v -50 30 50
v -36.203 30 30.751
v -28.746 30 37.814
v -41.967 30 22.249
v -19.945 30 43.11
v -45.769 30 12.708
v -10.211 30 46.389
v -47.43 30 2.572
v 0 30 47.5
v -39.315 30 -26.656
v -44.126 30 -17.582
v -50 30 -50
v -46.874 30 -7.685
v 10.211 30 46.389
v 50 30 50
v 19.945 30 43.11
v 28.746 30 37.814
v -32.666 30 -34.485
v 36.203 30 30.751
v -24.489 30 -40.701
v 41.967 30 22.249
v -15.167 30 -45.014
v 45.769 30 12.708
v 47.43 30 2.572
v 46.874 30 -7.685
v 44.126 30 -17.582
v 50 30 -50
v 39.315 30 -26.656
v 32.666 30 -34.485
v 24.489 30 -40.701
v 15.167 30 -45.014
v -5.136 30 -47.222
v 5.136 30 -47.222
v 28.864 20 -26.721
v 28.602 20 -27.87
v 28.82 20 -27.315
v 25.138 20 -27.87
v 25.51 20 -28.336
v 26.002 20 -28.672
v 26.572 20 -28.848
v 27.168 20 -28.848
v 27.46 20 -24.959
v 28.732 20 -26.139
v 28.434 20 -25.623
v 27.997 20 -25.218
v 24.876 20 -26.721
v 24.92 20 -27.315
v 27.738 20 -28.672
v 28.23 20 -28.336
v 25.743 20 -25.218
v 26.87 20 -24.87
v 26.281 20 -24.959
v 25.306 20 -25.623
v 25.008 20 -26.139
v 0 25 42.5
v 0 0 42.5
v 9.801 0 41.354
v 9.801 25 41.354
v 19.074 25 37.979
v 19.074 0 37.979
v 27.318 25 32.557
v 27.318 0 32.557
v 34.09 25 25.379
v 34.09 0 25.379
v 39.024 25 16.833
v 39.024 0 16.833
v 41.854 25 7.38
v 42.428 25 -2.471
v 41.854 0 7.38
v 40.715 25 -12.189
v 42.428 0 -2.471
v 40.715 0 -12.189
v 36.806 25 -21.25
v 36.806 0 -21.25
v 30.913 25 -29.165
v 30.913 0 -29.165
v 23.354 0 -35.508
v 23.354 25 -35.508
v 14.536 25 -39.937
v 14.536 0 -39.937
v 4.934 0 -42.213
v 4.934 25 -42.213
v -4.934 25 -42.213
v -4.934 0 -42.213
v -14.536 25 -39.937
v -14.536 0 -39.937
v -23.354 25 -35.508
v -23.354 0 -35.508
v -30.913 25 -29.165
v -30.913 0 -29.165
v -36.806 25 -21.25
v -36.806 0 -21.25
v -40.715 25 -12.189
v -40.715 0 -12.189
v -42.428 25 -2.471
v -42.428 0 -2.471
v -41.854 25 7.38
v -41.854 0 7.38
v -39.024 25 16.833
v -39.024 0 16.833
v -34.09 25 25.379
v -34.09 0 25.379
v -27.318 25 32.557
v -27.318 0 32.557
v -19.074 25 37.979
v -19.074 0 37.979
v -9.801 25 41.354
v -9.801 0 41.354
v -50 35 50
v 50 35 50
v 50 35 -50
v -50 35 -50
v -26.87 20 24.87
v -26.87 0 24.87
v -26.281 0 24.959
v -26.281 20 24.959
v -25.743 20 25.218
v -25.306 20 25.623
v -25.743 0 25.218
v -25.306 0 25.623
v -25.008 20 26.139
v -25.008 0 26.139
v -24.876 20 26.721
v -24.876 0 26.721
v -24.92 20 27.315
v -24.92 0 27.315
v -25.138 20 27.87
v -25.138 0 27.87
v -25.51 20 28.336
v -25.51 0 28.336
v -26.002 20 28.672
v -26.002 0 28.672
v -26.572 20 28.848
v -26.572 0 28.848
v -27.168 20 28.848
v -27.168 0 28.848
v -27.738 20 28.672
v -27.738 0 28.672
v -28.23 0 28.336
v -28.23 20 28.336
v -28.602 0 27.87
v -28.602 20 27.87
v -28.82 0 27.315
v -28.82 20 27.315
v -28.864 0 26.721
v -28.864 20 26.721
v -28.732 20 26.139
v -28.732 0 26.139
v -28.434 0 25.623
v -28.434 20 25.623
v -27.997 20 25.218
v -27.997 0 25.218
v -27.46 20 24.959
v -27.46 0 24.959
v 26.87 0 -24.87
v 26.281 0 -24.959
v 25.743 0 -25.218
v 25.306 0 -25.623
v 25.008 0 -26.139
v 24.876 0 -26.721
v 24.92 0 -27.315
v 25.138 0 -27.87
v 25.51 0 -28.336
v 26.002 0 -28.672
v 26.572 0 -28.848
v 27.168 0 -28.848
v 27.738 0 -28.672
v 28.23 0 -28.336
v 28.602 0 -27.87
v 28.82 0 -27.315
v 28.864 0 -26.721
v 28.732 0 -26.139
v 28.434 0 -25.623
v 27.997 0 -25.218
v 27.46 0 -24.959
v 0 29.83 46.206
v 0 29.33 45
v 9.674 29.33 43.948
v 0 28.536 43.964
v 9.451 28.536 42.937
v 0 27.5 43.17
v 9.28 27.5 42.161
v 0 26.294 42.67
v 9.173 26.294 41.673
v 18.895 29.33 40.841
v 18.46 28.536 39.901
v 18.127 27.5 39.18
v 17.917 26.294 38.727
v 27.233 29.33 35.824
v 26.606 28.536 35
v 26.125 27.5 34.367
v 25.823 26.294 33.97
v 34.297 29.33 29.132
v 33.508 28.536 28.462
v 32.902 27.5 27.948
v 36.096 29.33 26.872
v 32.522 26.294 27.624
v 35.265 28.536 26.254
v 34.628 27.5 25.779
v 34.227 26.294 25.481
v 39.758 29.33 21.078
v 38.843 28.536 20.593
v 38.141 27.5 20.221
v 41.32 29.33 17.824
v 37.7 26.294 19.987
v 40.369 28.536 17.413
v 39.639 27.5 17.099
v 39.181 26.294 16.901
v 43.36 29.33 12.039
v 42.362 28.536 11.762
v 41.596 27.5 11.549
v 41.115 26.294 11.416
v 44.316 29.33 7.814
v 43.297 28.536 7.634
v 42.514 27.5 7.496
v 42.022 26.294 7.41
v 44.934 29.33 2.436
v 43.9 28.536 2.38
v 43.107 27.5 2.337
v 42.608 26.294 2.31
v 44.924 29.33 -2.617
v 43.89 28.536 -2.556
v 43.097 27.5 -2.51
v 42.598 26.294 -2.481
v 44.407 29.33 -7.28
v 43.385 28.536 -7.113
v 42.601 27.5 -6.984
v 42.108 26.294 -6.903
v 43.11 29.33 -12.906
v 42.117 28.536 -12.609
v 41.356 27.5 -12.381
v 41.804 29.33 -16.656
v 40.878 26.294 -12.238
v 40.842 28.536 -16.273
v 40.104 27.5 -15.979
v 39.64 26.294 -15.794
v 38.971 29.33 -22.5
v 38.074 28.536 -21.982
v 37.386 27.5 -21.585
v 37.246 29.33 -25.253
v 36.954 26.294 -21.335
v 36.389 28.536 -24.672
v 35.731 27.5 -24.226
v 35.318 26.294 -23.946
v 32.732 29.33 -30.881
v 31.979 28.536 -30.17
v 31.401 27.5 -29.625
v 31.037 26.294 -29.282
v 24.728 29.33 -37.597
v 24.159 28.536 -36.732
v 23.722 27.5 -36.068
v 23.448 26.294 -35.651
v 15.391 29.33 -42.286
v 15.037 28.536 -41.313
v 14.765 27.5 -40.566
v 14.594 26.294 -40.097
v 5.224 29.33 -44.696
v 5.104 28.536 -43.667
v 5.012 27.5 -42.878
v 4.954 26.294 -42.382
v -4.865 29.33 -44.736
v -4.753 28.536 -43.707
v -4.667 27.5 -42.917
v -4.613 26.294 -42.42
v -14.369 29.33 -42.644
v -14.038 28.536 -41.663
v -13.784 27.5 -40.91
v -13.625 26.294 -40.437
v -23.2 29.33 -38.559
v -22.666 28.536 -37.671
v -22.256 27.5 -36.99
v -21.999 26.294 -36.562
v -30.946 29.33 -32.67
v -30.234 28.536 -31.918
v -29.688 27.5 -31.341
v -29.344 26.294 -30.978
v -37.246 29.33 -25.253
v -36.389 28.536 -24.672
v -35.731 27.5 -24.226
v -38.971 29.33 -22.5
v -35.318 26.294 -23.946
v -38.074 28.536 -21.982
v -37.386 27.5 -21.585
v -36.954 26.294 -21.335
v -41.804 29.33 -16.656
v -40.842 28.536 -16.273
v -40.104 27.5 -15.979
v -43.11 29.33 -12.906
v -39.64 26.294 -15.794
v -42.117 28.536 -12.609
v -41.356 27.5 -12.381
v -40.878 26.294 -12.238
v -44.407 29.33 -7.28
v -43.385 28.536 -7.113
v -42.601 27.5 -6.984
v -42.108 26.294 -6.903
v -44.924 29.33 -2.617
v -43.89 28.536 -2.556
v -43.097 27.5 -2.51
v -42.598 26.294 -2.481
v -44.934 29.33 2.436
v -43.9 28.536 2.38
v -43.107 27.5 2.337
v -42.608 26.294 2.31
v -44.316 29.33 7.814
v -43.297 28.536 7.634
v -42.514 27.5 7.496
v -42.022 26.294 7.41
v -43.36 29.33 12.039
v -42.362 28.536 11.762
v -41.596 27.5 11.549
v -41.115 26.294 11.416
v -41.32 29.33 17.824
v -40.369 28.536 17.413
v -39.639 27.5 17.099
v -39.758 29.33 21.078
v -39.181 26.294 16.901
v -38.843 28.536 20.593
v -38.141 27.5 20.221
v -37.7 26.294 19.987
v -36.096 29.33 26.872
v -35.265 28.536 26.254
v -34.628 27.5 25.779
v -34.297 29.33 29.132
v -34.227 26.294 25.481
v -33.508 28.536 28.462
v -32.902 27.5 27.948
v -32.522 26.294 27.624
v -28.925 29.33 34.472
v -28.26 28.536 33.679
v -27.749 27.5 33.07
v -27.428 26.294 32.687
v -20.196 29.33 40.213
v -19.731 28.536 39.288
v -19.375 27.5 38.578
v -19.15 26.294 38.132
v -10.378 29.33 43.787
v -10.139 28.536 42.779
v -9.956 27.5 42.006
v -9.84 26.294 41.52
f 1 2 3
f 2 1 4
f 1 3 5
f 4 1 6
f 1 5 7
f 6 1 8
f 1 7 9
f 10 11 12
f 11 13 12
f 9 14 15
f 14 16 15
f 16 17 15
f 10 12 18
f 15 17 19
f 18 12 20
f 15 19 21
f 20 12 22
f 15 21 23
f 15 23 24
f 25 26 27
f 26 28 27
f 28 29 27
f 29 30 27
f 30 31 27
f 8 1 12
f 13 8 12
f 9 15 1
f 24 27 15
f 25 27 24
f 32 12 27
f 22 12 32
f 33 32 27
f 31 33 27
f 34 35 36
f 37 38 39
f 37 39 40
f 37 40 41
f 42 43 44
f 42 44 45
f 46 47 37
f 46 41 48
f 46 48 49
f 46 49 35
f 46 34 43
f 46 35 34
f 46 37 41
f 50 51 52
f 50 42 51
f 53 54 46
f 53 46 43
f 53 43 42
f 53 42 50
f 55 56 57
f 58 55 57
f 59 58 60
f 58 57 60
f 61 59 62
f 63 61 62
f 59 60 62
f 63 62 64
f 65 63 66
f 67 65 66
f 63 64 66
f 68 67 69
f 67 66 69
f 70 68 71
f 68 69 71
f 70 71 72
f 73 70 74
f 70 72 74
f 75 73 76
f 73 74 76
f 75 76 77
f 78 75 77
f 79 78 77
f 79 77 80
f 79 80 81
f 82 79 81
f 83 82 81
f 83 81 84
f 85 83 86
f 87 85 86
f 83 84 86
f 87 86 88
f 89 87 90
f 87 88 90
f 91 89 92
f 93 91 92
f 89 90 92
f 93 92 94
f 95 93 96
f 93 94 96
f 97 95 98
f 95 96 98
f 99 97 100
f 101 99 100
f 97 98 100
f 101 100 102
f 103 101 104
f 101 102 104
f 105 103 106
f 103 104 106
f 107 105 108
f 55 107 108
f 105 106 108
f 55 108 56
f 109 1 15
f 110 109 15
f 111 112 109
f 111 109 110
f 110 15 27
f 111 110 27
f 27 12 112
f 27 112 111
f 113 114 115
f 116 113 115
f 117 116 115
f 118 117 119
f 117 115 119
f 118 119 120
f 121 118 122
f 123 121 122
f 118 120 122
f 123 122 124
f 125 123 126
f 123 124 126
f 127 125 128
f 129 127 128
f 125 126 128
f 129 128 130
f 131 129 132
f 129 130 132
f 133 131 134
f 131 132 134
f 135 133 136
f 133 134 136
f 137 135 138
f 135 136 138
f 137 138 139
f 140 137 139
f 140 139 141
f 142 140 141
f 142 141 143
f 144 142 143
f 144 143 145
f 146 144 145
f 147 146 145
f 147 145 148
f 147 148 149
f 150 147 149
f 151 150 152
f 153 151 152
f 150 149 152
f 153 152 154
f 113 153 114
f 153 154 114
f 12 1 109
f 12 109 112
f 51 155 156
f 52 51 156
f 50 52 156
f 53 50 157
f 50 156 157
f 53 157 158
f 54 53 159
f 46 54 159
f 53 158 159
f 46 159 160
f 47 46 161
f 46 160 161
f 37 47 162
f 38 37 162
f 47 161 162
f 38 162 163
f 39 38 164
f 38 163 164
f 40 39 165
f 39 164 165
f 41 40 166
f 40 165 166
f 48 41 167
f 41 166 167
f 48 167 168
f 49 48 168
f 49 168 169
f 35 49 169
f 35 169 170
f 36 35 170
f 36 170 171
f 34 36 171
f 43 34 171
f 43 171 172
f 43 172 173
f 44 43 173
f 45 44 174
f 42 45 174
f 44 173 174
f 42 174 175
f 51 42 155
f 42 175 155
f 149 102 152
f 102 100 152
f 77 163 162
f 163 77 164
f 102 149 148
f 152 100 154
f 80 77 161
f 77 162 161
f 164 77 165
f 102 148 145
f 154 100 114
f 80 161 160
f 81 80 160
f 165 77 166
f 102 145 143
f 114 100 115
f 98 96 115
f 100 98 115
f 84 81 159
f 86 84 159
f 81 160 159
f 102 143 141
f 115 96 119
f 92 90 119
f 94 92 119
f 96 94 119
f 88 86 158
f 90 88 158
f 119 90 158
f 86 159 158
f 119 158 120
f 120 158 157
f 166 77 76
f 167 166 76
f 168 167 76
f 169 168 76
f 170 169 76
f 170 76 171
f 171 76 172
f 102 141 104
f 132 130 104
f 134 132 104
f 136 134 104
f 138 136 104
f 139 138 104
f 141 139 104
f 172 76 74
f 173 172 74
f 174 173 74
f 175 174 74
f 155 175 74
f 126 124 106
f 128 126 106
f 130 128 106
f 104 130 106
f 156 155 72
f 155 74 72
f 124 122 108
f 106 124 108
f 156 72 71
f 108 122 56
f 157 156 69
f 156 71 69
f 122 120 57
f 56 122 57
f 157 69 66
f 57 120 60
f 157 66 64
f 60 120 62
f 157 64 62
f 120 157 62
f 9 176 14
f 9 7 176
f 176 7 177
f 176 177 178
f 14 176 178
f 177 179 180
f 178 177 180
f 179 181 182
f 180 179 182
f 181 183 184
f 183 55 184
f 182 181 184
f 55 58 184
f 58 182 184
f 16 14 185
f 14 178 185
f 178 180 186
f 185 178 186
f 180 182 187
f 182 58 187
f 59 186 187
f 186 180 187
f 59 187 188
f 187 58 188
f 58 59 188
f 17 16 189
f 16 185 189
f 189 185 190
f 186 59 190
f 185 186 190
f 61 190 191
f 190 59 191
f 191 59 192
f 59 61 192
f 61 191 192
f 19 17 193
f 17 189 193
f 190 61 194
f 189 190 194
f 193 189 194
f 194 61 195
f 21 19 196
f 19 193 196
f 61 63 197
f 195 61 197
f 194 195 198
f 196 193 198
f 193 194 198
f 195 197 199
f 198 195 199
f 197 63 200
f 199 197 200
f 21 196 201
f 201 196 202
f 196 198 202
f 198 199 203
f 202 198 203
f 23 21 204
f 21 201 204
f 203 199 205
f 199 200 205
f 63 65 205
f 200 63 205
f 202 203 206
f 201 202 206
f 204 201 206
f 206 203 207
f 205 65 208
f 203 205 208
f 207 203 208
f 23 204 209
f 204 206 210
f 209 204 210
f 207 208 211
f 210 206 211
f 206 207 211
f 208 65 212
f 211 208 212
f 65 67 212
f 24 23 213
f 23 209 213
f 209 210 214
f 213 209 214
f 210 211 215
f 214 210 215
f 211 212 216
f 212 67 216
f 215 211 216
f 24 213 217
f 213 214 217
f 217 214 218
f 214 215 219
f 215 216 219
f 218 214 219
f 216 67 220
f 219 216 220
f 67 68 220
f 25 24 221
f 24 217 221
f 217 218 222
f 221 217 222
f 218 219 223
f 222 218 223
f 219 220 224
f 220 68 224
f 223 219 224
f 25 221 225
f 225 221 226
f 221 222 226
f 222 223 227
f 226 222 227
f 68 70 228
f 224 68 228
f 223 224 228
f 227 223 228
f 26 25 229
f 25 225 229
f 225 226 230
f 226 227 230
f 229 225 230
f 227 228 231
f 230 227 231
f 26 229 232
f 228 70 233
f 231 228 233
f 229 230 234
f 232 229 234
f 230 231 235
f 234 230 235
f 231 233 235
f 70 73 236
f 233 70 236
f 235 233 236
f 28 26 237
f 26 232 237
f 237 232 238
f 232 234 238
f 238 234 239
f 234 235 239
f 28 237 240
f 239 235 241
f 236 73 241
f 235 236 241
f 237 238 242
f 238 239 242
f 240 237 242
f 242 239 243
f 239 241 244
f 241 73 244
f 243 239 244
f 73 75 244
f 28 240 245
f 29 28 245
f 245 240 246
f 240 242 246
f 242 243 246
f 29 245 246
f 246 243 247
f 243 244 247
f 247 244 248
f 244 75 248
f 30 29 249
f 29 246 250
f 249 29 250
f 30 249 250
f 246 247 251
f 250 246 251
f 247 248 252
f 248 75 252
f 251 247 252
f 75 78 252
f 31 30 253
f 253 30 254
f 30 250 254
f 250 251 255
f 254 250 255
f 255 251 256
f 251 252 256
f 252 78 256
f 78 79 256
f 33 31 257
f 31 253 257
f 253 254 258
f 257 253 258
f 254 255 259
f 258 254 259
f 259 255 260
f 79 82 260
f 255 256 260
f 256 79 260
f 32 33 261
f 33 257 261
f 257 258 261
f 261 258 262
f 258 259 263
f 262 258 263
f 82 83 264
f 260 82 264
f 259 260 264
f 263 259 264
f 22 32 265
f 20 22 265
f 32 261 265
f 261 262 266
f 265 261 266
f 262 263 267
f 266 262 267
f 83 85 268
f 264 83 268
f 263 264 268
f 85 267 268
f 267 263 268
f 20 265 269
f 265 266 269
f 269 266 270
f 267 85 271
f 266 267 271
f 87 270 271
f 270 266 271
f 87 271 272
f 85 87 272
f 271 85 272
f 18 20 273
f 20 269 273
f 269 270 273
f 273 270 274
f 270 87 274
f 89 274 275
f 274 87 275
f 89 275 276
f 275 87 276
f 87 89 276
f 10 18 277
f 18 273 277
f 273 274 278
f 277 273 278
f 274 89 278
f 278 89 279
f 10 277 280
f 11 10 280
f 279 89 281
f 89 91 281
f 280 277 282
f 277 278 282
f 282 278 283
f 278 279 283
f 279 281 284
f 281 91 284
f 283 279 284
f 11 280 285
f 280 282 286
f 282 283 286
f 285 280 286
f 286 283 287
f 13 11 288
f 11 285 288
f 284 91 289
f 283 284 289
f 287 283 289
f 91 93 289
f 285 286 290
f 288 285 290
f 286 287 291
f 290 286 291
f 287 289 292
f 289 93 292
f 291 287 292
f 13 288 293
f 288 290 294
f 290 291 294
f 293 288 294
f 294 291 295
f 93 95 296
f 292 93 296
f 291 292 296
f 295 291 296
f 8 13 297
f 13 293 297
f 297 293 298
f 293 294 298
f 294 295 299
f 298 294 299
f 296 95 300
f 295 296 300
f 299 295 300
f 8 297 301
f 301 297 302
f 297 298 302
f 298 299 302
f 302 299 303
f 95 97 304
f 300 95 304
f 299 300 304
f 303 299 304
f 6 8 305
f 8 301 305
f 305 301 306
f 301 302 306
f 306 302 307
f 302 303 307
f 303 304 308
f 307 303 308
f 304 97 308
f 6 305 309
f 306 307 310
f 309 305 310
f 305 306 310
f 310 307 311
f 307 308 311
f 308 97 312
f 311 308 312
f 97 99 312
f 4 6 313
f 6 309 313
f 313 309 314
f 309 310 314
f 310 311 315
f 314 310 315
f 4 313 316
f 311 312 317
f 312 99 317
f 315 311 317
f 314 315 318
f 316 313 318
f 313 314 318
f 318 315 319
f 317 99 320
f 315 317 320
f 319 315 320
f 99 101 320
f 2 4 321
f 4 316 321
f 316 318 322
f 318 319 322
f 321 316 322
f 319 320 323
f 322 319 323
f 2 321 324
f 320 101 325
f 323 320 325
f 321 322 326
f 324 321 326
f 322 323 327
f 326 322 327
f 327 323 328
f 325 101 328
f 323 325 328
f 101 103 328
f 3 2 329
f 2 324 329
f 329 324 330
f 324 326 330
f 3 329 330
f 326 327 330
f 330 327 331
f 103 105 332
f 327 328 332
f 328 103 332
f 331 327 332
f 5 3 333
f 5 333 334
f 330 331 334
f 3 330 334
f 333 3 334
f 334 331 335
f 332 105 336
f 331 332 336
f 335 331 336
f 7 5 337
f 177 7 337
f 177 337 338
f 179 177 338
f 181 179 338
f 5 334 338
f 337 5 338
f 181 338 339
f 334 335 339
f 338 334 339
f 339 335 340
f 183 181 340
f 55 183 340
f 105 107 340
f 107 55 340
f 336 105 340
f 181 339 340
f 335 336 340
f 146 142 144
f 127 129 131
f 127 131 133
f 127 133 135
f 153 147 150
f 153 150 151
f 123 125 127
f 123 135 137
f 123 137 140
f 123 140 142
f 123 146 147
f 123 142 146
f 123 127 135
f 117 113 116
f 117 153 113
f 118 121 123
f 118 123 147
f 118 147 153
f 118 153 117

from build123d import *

# Parameters (mm, degrees)
CROQUIS1_R              = 42.5
SALIENTE_EXTRUIR1_DEPTH = 30
CROQUIS2_W              = 100
CROQUIS2_H              = 100
SALIENTE_EXTRUIR2_DEPTH = 5
REDONDEO1_R             = 5
CROQUIS3_R              = 2
CORTAR_EXTRUIR1_DEPTH   = 20


with BuildPart() as part:
    # Croquis1 → Saliente-Extruir1 (new body)
    with BuildSketch(Plane(origin=(0, 0, 0), x_dir=(1, 0, 0), z_dir=(0, 1, 0))):
        with Locations(Location((0, 0, 0), (0, 0, 270))):
            Circle(CROQUIS1_R)
    extrude(amount=SALIENTE_EXTRUIR1_DEPTH)

    # Croquis2 → Saliente-Extruir2 (add)
    with BuildSketch(Plane(origin=(0, 30, 0), x_dir=(1, 0, 0), z_dir=(0, 1, 0))):
        Rectangle(CROQUIS2_W, CROQUIS2_H)
    extrude(amount=SALIENTE_EXTRUIR2_DEPTH)

    # Redondeo1
    redondeo1_edges = [part.edges().sort_by_distance(p)[0] for p in [
        (0, 30, -42.5),
    ]]
    fillet(redondeo1_edges, radius=REDONDEO1_R)

    # Croquis3 → Cortar-Extruir1 (cut)
    with BuildSketch(Plane.XZ):
        with Locations(Location((-26.870057685, 26.870057685, 0), (0, 0, 270))):
            Circle(CROQUIS3_R)
        with Locations(Location((26.870057685, -26.870057685, 0), (0, 0, 90))):
            Circle(CROQUIS3_R)
    extrude(amount=-CORTAR_EXTRUIR1_DEPTH, mode=Mode.SUBTRACT)


solid = part.part
